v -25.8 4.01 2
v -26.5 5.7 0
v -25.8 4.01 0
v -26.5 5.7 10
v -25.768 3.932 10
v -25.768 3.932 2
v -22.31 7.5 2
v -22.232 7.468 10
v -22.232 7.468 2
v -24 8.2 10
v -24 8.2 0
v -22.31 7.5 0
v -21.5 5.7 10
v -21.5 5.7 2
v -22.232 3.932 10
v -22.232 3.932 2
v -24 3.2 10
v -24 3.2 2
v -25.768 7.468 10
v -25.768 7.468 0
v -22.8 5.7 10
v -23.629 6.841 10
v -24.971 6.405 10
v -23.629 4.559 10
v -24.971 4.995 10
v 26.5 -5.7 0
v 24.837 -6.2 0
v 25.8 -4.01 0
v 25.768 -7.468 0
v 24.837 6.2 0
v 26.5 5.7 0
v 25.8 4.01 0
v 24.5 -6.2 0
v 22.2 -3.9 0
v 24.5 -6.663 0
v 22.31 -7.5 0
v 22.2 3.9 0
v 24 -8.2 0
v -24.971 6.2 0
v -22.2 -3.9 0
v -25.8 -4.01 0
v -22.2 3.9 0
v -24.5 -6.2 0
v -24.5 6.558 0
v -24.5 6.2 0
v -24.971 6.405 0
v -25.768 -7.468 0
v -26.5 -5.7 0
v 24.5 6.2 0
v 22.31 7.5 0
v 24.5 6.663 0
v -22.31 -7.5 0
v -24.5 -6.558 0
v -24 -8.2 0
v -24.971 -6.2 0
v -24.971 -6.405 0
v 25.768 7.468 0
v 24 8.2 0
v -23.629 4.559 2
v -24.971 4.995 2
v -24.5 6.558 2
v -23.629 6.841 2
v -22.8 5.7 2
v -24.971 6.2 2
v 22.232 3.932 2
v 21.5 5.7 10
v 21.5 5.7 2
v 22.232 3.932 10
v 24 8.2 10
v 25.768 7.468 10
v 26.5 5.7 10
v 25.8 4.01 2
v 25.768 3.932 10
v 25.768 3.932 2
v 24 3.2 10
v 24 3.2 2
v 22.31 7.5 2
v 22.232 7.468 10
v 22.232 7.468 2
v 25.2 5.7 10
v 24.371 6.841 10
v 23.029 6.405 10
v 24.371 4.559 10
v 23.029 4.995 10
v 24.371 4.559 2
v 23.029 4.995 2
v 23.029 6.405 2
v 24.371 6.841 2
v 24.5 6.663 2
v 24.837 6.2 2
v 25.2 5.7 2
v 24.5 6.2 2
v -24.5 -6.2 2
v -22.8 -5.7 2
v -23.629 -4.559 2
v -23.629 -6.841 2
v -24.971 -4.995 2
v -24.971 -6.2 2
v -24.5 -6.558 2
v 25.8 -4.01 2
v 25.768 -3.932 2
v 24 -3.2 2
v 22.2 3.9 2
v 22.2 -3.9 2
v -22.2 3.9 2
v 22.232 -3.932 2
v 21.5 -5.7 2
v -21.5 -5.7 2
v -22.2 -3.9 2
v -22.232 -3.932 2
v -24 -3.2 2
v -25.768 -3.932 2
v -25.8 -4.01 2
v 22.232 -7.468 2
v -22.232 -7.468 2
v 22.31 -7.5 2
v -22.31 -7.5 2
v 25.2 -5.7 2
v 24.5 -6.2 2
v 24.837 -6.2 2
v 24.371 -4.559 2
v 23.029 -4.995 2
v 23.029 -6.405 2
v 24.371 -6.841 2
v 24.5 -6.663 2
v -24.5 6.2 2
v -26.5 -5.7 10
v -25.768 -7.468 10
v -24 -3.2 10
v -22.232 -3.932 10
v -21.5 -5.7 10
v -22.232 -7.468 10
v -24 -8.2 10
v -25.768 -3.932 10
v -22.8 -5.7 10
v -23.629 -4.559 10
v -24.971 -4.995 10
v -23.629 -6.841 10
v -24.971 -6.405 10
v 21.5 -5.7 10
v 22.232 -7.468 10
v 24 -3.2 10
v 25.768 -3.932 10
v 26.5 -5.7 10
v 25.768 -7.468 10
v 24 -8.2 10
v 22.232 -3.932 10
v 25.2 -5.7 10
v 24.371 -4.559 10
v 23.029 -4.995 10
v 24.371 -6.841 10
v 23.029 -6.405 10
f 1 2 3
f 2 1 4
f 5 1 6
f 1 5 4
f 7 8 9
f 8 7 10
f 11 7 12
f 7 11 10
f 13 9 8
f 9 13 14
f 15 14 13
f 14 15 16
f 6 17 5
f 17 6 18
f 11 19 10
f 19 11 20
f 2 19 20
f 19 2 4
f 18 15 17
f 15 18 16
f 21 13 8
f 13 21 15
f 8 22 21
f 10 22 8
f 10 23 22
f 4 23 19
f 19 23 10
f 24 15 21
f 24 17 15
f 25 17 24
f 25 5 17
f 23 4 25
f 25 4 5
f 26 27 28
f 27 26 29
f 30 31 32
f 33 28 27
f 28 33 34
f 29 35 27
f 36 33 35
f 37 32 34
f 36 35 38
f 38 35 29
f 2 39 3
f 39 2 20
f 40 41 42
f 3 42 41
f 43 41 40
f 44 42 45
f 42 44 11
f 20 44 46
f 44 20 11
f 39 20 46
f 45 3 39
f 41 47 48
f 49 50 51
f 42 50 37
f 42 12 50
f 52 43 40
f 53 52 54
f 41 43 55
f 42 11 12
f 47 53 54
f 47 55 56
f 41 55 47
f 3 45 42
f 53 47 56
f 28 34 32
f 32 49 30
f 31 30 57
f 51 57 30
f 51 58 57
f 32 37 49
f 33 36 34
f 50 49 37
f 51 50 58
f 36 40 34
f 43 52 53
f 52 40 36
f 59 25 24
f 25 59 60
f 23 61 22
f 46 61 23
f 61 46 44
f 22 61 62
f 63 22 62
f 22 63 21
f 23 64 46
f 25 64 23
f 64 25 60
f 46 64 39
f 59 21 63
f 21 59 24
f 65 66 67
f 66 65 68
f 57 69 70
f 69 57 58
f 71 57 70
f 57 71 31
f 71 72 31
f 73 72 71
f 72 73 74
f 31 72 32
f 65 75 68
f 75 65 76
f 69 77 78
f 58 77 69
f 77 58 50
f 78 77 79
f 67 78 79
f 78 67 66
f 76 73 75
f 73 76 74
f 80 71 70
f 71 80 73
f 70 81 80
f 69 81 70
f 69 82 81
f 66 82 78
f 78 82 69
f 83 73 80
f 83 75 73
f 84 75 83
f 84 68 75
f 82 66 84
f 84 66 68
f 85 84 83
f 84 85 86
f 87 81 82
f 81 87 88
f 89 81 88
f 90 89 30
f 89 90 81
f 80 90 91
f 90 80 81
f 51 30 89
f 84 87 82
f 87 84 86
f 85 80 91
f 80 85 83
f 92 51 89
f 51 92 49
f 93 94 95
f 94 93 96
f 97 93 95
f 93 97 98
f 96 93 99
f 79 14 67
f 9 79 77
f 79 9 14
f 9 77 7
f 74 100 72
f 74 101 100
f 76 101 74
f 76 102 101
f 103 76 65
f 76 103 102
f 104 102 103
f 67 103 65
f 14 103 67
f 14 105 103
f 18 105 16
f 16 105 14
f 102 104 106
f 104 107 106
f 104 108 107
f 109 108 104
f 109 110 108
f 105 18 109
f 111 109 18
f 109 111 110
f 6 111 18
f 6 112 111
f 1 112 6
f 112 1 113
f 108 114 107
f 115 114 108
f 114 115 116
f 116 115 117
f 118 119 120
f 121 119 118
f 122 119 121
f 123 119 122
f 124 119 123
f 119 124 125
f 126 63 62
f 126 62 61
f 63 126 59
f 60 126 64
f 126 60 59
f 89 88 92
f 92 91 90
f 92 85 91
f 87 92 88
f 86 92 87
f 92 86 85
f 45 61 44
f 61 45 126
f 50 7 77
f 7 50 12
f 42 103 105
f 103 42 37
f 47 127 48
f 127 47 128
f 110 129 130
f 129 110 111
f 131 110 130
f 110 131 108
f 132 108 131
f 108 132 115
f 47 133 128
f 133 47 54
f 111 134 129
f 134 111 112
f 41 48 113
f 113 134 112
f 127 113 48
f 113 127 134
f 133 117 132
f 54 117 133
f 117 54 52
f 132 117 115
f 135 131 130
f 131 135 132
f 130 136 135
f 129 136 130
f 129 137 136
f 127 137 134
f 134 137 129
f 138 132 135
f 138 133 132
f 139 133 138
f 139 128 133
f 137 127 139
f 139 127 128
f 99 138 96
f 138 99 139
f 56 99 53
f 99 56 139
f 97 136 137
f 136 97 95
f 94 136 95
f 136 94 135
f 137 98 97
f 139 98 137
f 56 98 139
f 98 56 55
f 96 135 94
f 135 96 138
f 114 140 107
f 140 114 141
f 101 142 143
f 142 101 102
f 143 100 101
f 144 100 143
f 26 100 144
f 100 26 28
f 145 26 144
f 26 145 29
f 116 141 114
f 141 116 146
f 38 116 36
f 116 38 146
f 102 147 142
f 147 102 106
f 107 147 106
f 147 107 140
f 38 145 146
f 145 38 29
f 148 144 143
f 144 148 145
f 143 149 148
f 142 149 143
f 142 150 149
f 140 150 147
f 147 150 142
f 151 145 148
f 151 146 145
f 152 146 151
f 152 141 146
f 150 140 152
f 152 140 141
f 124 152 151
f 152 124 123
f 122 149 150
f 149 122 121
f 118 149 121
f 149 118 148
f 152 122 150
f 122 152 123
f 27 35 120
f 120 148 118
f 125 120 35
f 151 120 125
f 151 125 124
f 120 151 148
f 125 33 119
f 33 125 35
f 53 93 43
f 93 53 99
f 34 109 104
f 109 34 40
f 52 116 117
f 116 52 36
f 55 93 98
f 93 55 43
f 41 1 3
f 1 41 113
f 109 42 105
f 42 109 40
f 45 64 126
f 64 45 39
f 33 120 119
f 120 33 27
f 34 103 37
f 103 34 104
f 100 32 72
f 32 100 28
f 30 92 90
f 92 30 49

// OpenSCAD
union() {
	translate(v = [0, 5.7000000000, 0]) {
		union() {
			translate(v = [0, 0, 1.0000000000]) {
				cube(center = true, size = [49.0000000000, 3.6000000000, 2]);
			}
			translate(v = [-24.0000000000, 0, 0]) {
				difference() {
					cylinder(d = 5, h = 10);
					cylinder(d = 2.4000000000, h = 10);
				}
			}
			translate(v = [24.0000000000, 0, 0]) {
				difference() {
					cylinder(d = 5, h = 10);
					cylinder(d = 2.4000000000, h = 10);
				}
			}
		}
	}
	translate(v = [0, -5.7000000000, 0]) {
		union() {
			translate(v = [0, 0, 1.0000000000]) {
				cube(center = true, size = [49.0000000000, 3.6000000000, 2]);
			}
			translate(v = [-24.0000000000, 0, 0]) {
				difference() {
					cylinder(d = 5, h = 10);
					cylinder(d = 2.4000000000, h = 10);
				}
			}
			translate(v = [24.0000000000, 0, 0]) {
				difference() {
					cylinder(d = 5, h = 10);
					cylinder(d = 2.4000000000, h = 10);
				}
			}
		}
	}
	translate(v = [-24.0000000000, 0, 0]) {
		rotate(a = [0, 0, 90]) {
			translate(v = [0, 0, 1.0000000000]) {
				cube(center = true, size = [12.4000000000, 3.6000000000, 2]);
			}
		}
	}
	translate(v = [24.0000000000, 0, 0]) {
		rotate(a = [0, 0, 90]) {
			translate(v = [0, 0, 1.0000000000]) {
				cube(center = true, size = [12.4000000000, 3.6000000000, 2]);
			}
		}
	}
}
